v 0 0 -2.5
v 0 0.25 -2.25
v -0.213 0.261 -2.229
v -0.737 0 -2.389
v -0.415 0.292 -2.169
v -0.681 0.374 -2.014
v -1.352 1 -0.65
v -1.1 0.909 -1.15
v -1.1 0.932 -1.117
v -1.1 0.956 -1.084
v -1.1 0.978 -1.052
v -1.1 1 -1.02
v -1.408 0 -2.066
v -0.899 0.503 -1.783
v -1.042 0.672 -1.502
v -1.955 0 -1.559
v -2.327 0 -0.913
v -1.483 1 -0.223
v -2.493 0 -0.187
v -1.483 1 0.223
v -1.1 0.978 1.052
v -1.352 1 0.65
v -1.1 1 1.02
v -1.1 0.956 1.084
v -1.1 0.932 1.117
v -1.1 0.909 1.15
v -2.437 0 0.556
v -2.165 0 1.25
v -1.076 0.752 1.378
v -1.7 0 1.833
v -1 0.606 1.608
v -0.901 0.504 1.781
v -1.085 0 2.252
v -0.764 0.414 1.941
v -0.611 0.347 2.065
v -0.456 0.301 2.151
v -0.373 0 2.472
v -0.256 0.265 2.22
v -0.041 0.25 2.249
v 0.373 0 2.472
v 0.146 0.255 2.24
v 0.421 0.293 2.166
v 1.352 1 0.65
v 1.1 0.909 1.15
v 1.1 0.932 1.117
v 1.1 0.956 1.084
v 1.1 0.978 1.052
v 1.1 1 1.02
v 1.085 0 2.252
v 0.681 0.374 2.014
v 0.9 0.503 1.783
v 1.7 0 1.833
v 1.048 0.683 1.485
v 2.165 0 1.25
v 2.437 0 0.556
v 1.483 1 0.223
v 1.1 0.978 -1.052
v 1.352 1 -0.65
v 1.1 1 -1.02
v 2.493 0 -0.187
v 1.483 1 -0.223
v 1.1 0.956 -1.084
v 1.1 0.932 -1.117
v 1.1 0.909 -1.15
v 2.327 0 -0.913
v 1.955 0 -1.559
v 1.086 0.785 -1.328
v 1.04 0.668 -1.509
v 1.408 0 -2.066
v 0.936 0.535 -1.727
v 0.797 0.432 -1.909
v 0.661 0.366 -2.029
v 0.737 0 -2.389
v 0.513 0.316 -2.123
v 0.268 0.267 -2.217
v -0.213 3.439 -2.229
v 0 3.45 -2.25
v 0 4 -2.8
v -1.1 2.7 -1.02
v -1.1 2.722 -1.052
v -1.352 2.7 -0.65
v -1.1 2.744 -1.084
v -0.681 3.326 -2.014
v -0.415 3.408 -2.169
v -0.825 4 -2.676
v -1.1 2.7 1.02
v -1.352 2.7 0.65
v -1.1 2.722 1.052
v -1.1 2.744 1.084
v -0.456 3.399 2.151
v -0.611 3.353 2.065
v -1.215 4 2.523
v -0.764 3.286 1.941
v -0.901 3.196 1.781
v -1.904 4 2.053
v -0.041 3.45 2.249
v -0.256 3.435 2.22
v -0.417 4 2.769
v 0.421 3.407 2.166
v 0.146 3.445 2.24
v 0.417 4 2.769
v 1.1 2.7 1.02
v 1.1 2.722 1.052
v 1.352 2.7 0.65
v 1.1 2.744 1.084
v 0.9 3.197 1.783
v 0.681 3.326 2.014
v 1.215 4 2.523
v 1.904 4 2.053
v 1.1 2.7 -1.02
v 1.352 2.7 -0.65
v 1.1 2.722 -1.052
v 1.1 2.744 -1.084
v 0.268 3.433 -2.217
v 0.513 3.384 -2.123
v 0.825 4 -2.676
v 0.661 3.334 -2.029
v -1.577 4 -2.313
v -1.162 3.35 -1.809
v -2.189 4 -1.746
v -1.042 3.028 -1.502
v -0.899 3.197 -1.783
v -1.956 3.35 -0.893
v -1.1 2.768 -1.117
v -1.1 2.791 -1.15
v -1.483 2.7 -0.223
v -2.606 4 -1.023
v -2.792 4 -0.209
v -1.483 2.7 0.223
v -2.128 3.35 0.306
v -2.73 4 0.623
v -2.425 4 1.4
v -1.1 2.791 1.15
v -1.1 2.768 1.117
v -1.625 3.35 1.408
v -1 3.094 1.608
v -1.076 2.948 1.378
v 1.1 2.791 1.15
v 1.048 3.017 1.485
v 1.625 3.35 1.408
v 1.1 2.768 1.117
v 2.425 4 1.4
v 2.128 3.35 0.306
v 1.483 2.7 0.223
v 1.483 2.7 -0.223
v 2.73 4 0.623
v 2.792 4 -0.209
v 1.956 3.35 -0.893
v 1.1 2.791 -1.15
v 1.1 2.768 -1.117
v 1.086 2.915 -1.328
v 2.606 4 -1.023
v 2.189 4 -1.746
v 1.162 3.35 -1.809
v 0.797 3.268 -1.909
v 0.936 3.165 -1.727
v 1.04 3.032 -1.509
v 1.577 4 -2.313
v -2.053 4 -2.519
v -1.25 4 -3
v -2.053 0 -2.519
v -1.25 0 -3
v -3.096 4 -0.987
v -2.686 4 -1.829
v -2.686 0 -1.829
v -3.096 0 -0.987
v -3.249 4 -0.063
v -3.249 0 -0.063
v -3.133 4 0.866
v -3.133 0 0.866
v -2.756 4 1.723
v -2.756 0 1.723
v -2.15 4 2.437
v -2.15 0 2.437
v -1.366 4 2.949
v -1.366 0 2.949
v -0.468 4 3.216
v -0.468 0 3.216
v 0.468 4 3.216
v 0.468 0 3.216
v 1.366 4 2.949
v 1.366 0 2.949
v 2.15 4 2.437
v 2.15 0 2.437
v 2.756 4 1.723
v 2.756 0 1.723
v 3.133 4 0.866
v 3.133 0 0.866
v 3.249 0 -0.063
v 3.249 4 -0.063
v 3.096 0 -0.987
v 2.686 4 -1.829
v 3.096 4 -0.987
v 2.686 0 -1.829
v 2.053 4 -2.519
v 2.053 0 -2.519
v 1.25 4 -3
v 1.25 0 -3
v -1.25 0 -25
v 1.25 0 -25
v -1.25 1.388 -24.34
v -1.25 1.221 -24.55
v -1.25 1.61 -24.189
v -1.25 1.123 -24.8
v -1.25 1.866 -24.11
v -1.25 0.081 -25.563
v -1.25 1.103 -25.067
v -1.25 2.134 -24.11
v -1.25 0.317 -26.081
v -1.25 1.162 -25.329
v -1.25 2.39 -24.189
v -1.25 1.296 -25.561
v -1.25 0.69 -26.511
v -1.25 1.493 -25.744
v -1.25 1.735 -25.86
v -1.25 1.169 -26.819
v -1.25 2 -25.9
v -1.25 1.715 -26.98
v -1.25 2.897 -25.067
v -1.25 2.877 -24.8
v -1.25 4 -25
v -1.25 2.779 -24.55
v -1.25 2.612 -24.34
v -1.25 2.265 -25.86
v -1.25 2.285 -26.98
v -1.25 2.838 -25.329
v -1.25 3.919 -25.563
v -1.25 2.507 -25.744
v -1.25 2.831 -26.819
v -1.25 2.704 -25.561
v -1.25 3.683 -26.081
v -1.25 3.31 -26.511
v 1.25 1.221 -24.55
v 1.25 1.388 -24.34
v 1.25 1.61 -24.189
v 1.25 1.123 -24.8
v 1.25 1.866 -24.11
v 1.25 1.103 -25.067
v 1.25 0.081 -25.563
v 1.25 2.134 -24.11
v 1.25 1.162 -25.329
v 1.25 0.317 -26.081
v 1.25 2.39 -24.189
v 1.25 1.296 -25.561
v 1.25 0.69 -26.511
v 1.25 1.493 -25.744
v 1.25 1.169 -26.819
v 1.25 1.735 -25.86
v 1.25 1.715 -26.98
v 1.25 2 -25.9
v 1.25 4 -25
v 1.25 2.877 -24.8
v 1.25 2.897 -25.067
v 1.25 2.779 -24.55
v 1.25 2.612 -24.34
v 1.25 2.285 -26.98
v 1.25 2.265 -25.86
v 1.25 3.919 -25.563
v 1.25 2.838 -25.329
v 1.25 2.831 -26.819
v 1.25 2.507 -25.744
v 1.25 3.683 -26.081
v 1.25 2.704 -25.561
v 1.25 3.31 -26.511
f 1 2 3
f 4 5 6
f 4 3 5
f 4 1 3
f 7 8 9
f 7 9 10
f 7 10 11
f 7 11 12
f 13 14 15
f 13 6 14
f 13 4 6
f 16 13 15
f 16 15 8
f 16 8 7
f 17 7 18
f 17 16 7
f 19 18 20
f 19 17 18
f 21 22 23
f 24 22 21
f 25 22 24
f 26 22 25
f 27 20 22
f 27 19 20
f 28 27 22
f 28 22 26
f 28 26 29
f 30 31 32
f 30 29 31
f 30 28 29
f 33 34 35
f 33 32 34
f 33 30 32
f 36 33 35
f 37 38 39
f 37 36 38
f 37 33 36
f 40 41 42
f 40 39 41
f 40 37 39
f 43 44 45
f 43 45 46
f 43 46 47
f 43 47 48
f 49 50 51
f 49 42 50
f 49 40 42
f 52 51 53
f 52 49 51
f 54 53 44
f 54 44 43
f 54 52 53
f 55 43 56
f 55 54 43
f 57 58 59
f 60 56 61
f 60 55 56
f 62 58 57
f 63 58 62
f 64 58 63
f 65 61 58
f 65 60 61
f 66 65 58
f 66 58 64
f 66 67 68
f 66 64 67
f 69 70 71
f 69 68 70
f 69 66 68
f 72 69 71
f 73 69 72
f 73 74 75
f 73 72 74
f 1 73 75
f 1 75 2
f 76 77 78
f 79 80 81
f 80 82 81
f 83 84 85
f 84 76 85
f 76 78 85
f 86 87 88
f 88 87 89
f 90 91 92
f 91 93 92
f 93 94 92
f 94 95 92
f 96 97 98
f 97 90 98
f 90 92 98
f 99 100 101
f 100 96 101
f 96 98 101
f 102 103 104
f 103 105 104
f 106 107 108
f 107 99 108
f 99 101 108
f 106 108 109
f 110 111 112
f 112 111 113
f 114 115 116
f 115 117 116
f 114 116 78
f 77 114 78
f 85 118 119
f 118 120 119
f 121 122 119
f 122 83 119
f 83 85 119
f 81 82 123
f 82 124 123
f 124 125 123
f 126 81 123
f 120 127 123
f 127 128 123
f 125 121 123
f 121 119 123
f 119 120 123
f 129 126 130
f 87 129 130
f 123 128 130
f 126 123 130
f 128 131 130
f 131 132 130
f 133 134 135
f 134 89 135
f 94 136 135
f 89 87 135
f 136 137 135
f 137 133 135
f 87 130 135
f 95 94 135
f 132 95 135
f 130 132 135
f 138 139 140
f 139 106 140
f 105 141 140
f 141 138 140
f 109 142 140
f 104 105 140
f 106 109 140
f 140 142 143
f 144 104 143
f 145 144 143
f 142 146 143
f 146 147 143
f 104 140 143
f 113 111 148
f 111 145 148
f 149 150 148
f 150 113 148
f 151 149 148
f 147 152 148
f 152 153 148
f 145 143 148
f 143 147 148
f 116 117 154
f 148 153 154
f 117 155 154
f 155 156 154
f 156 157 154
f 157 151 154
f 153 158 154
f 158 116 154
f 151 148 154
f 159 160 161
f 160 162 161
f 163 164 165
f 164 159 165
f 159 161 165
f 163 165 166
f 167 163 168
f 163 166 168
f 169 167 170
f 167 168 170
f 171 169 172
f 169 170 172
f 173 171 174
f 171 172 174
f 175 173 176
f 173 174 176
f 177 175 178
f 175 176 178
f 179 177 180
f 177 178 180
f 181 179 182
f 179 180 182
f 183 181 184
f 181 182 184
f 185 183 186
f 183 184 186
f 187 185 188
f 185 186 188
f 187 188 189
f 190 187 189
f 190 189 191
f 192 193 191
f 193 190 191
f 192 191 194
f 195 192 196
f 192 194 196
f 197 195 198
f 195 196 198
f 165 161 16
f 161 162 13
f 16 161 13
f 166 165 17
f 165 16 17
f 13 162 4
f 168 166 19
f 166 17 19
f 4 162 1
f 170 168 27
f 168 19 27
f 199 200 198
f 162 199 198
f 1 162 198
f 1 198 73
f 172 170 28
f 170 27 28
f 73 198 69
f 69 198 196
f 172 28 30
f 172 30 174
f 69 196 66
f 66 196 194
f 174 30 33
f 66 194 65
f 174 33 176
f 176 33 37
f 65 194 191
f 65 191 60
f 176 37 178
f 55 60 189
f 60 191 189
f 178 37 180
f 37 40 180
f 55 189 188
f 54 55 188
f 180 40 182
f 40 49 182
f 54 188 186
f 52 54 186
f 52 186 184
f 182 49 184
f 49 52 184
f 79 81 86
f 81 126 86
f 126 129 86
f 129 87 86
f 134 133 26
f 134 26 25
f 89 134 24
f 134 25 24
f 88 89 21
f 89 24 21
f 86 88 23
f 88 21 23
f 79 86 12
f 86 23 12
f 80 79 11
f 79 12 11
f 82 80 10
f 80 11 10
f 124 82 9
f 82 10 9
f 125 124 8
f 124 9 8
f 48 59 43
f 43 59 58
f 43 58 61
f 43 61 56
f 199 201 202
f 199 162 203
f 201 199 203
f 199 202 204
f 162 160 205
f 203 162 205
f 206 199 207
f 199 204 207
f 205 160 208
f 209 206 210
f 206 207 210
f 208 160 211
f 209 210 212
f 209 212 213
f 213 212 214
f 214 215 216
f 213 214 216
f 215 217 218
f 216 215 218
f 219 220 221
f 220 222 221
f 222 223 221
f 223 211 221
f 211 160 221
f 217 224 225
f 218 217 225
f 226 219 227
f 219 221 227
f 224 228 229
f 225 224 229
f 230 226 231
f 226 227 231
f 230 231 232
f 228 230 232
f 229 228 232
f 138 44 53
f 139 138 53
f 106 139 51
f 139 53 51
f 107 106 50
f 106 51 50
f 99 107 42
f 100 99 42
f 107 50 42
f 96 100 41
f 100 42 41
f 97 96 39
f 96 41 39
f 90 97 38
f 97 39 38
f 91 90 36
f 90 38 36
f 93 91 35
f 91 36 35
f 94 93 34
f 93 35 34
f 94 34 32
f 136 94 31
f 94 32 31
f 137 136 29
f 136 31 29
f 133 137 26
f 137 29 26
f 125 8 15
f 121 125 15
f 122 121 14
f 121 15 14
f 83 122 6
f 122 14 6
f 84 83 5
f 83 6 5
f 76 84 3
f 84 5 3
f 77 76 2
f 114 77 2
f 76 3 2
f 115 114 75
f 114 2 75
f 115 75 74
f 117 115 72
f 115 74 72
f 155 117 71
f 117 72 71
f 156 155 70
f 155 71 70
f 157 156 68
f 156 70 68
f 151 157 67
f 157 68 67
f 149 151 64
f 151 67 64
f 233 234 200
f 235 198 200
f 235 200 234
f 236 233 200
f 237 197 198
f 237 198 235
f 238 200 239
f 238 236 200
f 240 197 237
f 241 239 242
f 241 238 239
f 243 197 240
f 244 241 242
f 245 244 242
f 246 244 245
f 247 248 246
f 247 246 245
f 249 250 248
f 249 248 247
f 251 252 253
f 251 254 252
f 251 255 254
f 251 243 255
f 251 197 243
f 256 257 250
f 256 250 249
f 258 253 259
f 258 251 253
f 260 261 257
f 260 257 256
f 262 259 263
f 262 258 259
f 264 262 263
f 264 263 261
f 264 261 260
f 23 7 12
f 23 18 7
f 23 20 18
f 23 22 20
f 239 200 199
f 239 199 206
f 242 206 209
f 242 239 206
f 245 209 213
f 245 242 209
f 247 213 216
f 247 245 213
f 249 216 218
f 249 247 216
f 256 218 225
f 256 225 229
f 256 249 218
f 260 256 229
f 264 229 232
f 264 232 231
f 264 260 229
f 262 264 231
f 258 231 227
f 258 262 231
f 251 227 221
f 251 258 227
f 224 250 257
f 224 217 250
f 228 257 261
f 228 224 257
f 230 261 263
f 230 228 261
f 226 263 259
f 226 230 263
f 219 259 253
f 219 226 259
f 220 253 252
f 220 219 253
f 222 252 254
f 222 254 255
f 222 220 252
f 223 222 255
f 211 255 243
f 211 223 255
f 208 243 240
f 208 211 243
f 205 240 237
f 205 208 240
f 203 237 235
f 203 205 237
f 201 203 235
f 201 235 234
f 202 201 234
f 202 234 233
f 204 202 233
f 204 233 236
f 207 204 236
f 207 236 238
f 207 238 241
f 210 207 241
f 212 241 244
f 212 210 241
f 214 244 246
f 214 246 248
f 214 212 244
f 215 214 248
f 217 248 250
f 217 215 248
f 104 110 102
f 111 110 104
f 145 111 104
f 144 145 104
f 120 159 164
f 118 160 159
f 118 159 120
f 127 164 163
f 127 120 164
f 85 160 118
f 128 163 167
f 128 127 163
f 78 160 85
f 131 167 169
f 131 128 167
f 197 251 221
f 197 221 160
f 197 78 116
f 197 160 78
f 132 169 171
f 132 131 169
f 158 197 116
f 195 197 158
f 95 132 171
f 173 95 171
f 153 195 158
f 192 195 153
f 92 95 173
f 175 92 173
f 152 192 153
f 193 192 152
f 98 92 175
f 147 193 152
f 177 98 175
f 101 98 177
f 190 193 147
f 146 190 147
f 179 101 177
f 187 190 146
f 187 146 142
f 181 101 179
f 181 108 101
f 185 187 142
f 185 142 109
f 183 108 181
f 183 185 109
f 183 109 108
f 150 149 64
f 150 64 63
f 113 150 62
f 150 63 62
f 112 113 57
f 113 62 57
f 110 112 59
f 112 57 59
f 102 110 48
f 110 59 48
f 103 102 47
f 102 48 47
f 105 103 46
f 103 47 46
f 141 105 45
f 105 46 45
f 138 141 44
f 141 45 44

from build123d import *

# Parameters (mm, degrees)
SKETCH1_R      = 3.25
EXTRUDE1_DEPTH = 4
SKETCH2_R      = 0.9
EXTRUDE2_DEPTH = 1.25


with BuildPart() as part:
    # Sketch1 → Extrude1 (new body)
    with BuildSketch(Plane(origin=(0, 0, 0), x_dir=(1, 0, 0), z_dir=(0, 1, 0))):
        with Locations(Location((0, 0, 0), (0, 0, 270))):  # turned: the seam where the file's is
            Circle(SKETCH1_R)
        with BuildLine():
            Line((1.1, 1.15), (1.1, -1.15))
            ThreePointArc((1.1, -1.15), (0, -2.25), (-1.1, -1.15))
            Line((-1.1, -1.15), (-1.1, 1.15))
            ThreePointArc((-1.1, 1.15), (0, 2.25), (1.1, 1.15))
        make_face(mode=Mode.SUBTRACT)
    extrude(amount=EXTRUDE1_DEPTH)

    # Sketch2 → Extrude2 (add, symmetric)
    with BuildSketch(Plane(origin=(0, 0, 0), x_dir=(0, 0, -1), z_dir=(1, 0, 0))):
        with BuildLine():
            Line((3, 4), (3, 0))
            Line((3, 0), (25, 0))
            ThreePointArc((25, 0), (27, 2), (25, 4))
            Line((25, 4), (3, 4))
        make_face()
        with Locations((25, 2)):
            Circle(SKETCH2_R, mode=Mode.SUBTRACT)
    extrude(amount=EXTRUDE2_DEPTH, both=True)

    # Sketch4 → Cut-Revolve1 (revolve, cut)
    with BuildSketch(Plane(origin=(0, 0, 0), x_dir=(0, 0, -1), z_dir=(1, 0, 0))):
        Polygon((0, 2.7), (1.5, 2.7), (2.8, 4), (0, 4), align=None)
        Polygon((0, 1), (1.5, 1), (2.5, 0), (0, 0), align=None)
    revolve(axis=Axis((0, 0, 0), (0, 1, 0)), mode=Mode.SUBTRACT)


solid = part.part
